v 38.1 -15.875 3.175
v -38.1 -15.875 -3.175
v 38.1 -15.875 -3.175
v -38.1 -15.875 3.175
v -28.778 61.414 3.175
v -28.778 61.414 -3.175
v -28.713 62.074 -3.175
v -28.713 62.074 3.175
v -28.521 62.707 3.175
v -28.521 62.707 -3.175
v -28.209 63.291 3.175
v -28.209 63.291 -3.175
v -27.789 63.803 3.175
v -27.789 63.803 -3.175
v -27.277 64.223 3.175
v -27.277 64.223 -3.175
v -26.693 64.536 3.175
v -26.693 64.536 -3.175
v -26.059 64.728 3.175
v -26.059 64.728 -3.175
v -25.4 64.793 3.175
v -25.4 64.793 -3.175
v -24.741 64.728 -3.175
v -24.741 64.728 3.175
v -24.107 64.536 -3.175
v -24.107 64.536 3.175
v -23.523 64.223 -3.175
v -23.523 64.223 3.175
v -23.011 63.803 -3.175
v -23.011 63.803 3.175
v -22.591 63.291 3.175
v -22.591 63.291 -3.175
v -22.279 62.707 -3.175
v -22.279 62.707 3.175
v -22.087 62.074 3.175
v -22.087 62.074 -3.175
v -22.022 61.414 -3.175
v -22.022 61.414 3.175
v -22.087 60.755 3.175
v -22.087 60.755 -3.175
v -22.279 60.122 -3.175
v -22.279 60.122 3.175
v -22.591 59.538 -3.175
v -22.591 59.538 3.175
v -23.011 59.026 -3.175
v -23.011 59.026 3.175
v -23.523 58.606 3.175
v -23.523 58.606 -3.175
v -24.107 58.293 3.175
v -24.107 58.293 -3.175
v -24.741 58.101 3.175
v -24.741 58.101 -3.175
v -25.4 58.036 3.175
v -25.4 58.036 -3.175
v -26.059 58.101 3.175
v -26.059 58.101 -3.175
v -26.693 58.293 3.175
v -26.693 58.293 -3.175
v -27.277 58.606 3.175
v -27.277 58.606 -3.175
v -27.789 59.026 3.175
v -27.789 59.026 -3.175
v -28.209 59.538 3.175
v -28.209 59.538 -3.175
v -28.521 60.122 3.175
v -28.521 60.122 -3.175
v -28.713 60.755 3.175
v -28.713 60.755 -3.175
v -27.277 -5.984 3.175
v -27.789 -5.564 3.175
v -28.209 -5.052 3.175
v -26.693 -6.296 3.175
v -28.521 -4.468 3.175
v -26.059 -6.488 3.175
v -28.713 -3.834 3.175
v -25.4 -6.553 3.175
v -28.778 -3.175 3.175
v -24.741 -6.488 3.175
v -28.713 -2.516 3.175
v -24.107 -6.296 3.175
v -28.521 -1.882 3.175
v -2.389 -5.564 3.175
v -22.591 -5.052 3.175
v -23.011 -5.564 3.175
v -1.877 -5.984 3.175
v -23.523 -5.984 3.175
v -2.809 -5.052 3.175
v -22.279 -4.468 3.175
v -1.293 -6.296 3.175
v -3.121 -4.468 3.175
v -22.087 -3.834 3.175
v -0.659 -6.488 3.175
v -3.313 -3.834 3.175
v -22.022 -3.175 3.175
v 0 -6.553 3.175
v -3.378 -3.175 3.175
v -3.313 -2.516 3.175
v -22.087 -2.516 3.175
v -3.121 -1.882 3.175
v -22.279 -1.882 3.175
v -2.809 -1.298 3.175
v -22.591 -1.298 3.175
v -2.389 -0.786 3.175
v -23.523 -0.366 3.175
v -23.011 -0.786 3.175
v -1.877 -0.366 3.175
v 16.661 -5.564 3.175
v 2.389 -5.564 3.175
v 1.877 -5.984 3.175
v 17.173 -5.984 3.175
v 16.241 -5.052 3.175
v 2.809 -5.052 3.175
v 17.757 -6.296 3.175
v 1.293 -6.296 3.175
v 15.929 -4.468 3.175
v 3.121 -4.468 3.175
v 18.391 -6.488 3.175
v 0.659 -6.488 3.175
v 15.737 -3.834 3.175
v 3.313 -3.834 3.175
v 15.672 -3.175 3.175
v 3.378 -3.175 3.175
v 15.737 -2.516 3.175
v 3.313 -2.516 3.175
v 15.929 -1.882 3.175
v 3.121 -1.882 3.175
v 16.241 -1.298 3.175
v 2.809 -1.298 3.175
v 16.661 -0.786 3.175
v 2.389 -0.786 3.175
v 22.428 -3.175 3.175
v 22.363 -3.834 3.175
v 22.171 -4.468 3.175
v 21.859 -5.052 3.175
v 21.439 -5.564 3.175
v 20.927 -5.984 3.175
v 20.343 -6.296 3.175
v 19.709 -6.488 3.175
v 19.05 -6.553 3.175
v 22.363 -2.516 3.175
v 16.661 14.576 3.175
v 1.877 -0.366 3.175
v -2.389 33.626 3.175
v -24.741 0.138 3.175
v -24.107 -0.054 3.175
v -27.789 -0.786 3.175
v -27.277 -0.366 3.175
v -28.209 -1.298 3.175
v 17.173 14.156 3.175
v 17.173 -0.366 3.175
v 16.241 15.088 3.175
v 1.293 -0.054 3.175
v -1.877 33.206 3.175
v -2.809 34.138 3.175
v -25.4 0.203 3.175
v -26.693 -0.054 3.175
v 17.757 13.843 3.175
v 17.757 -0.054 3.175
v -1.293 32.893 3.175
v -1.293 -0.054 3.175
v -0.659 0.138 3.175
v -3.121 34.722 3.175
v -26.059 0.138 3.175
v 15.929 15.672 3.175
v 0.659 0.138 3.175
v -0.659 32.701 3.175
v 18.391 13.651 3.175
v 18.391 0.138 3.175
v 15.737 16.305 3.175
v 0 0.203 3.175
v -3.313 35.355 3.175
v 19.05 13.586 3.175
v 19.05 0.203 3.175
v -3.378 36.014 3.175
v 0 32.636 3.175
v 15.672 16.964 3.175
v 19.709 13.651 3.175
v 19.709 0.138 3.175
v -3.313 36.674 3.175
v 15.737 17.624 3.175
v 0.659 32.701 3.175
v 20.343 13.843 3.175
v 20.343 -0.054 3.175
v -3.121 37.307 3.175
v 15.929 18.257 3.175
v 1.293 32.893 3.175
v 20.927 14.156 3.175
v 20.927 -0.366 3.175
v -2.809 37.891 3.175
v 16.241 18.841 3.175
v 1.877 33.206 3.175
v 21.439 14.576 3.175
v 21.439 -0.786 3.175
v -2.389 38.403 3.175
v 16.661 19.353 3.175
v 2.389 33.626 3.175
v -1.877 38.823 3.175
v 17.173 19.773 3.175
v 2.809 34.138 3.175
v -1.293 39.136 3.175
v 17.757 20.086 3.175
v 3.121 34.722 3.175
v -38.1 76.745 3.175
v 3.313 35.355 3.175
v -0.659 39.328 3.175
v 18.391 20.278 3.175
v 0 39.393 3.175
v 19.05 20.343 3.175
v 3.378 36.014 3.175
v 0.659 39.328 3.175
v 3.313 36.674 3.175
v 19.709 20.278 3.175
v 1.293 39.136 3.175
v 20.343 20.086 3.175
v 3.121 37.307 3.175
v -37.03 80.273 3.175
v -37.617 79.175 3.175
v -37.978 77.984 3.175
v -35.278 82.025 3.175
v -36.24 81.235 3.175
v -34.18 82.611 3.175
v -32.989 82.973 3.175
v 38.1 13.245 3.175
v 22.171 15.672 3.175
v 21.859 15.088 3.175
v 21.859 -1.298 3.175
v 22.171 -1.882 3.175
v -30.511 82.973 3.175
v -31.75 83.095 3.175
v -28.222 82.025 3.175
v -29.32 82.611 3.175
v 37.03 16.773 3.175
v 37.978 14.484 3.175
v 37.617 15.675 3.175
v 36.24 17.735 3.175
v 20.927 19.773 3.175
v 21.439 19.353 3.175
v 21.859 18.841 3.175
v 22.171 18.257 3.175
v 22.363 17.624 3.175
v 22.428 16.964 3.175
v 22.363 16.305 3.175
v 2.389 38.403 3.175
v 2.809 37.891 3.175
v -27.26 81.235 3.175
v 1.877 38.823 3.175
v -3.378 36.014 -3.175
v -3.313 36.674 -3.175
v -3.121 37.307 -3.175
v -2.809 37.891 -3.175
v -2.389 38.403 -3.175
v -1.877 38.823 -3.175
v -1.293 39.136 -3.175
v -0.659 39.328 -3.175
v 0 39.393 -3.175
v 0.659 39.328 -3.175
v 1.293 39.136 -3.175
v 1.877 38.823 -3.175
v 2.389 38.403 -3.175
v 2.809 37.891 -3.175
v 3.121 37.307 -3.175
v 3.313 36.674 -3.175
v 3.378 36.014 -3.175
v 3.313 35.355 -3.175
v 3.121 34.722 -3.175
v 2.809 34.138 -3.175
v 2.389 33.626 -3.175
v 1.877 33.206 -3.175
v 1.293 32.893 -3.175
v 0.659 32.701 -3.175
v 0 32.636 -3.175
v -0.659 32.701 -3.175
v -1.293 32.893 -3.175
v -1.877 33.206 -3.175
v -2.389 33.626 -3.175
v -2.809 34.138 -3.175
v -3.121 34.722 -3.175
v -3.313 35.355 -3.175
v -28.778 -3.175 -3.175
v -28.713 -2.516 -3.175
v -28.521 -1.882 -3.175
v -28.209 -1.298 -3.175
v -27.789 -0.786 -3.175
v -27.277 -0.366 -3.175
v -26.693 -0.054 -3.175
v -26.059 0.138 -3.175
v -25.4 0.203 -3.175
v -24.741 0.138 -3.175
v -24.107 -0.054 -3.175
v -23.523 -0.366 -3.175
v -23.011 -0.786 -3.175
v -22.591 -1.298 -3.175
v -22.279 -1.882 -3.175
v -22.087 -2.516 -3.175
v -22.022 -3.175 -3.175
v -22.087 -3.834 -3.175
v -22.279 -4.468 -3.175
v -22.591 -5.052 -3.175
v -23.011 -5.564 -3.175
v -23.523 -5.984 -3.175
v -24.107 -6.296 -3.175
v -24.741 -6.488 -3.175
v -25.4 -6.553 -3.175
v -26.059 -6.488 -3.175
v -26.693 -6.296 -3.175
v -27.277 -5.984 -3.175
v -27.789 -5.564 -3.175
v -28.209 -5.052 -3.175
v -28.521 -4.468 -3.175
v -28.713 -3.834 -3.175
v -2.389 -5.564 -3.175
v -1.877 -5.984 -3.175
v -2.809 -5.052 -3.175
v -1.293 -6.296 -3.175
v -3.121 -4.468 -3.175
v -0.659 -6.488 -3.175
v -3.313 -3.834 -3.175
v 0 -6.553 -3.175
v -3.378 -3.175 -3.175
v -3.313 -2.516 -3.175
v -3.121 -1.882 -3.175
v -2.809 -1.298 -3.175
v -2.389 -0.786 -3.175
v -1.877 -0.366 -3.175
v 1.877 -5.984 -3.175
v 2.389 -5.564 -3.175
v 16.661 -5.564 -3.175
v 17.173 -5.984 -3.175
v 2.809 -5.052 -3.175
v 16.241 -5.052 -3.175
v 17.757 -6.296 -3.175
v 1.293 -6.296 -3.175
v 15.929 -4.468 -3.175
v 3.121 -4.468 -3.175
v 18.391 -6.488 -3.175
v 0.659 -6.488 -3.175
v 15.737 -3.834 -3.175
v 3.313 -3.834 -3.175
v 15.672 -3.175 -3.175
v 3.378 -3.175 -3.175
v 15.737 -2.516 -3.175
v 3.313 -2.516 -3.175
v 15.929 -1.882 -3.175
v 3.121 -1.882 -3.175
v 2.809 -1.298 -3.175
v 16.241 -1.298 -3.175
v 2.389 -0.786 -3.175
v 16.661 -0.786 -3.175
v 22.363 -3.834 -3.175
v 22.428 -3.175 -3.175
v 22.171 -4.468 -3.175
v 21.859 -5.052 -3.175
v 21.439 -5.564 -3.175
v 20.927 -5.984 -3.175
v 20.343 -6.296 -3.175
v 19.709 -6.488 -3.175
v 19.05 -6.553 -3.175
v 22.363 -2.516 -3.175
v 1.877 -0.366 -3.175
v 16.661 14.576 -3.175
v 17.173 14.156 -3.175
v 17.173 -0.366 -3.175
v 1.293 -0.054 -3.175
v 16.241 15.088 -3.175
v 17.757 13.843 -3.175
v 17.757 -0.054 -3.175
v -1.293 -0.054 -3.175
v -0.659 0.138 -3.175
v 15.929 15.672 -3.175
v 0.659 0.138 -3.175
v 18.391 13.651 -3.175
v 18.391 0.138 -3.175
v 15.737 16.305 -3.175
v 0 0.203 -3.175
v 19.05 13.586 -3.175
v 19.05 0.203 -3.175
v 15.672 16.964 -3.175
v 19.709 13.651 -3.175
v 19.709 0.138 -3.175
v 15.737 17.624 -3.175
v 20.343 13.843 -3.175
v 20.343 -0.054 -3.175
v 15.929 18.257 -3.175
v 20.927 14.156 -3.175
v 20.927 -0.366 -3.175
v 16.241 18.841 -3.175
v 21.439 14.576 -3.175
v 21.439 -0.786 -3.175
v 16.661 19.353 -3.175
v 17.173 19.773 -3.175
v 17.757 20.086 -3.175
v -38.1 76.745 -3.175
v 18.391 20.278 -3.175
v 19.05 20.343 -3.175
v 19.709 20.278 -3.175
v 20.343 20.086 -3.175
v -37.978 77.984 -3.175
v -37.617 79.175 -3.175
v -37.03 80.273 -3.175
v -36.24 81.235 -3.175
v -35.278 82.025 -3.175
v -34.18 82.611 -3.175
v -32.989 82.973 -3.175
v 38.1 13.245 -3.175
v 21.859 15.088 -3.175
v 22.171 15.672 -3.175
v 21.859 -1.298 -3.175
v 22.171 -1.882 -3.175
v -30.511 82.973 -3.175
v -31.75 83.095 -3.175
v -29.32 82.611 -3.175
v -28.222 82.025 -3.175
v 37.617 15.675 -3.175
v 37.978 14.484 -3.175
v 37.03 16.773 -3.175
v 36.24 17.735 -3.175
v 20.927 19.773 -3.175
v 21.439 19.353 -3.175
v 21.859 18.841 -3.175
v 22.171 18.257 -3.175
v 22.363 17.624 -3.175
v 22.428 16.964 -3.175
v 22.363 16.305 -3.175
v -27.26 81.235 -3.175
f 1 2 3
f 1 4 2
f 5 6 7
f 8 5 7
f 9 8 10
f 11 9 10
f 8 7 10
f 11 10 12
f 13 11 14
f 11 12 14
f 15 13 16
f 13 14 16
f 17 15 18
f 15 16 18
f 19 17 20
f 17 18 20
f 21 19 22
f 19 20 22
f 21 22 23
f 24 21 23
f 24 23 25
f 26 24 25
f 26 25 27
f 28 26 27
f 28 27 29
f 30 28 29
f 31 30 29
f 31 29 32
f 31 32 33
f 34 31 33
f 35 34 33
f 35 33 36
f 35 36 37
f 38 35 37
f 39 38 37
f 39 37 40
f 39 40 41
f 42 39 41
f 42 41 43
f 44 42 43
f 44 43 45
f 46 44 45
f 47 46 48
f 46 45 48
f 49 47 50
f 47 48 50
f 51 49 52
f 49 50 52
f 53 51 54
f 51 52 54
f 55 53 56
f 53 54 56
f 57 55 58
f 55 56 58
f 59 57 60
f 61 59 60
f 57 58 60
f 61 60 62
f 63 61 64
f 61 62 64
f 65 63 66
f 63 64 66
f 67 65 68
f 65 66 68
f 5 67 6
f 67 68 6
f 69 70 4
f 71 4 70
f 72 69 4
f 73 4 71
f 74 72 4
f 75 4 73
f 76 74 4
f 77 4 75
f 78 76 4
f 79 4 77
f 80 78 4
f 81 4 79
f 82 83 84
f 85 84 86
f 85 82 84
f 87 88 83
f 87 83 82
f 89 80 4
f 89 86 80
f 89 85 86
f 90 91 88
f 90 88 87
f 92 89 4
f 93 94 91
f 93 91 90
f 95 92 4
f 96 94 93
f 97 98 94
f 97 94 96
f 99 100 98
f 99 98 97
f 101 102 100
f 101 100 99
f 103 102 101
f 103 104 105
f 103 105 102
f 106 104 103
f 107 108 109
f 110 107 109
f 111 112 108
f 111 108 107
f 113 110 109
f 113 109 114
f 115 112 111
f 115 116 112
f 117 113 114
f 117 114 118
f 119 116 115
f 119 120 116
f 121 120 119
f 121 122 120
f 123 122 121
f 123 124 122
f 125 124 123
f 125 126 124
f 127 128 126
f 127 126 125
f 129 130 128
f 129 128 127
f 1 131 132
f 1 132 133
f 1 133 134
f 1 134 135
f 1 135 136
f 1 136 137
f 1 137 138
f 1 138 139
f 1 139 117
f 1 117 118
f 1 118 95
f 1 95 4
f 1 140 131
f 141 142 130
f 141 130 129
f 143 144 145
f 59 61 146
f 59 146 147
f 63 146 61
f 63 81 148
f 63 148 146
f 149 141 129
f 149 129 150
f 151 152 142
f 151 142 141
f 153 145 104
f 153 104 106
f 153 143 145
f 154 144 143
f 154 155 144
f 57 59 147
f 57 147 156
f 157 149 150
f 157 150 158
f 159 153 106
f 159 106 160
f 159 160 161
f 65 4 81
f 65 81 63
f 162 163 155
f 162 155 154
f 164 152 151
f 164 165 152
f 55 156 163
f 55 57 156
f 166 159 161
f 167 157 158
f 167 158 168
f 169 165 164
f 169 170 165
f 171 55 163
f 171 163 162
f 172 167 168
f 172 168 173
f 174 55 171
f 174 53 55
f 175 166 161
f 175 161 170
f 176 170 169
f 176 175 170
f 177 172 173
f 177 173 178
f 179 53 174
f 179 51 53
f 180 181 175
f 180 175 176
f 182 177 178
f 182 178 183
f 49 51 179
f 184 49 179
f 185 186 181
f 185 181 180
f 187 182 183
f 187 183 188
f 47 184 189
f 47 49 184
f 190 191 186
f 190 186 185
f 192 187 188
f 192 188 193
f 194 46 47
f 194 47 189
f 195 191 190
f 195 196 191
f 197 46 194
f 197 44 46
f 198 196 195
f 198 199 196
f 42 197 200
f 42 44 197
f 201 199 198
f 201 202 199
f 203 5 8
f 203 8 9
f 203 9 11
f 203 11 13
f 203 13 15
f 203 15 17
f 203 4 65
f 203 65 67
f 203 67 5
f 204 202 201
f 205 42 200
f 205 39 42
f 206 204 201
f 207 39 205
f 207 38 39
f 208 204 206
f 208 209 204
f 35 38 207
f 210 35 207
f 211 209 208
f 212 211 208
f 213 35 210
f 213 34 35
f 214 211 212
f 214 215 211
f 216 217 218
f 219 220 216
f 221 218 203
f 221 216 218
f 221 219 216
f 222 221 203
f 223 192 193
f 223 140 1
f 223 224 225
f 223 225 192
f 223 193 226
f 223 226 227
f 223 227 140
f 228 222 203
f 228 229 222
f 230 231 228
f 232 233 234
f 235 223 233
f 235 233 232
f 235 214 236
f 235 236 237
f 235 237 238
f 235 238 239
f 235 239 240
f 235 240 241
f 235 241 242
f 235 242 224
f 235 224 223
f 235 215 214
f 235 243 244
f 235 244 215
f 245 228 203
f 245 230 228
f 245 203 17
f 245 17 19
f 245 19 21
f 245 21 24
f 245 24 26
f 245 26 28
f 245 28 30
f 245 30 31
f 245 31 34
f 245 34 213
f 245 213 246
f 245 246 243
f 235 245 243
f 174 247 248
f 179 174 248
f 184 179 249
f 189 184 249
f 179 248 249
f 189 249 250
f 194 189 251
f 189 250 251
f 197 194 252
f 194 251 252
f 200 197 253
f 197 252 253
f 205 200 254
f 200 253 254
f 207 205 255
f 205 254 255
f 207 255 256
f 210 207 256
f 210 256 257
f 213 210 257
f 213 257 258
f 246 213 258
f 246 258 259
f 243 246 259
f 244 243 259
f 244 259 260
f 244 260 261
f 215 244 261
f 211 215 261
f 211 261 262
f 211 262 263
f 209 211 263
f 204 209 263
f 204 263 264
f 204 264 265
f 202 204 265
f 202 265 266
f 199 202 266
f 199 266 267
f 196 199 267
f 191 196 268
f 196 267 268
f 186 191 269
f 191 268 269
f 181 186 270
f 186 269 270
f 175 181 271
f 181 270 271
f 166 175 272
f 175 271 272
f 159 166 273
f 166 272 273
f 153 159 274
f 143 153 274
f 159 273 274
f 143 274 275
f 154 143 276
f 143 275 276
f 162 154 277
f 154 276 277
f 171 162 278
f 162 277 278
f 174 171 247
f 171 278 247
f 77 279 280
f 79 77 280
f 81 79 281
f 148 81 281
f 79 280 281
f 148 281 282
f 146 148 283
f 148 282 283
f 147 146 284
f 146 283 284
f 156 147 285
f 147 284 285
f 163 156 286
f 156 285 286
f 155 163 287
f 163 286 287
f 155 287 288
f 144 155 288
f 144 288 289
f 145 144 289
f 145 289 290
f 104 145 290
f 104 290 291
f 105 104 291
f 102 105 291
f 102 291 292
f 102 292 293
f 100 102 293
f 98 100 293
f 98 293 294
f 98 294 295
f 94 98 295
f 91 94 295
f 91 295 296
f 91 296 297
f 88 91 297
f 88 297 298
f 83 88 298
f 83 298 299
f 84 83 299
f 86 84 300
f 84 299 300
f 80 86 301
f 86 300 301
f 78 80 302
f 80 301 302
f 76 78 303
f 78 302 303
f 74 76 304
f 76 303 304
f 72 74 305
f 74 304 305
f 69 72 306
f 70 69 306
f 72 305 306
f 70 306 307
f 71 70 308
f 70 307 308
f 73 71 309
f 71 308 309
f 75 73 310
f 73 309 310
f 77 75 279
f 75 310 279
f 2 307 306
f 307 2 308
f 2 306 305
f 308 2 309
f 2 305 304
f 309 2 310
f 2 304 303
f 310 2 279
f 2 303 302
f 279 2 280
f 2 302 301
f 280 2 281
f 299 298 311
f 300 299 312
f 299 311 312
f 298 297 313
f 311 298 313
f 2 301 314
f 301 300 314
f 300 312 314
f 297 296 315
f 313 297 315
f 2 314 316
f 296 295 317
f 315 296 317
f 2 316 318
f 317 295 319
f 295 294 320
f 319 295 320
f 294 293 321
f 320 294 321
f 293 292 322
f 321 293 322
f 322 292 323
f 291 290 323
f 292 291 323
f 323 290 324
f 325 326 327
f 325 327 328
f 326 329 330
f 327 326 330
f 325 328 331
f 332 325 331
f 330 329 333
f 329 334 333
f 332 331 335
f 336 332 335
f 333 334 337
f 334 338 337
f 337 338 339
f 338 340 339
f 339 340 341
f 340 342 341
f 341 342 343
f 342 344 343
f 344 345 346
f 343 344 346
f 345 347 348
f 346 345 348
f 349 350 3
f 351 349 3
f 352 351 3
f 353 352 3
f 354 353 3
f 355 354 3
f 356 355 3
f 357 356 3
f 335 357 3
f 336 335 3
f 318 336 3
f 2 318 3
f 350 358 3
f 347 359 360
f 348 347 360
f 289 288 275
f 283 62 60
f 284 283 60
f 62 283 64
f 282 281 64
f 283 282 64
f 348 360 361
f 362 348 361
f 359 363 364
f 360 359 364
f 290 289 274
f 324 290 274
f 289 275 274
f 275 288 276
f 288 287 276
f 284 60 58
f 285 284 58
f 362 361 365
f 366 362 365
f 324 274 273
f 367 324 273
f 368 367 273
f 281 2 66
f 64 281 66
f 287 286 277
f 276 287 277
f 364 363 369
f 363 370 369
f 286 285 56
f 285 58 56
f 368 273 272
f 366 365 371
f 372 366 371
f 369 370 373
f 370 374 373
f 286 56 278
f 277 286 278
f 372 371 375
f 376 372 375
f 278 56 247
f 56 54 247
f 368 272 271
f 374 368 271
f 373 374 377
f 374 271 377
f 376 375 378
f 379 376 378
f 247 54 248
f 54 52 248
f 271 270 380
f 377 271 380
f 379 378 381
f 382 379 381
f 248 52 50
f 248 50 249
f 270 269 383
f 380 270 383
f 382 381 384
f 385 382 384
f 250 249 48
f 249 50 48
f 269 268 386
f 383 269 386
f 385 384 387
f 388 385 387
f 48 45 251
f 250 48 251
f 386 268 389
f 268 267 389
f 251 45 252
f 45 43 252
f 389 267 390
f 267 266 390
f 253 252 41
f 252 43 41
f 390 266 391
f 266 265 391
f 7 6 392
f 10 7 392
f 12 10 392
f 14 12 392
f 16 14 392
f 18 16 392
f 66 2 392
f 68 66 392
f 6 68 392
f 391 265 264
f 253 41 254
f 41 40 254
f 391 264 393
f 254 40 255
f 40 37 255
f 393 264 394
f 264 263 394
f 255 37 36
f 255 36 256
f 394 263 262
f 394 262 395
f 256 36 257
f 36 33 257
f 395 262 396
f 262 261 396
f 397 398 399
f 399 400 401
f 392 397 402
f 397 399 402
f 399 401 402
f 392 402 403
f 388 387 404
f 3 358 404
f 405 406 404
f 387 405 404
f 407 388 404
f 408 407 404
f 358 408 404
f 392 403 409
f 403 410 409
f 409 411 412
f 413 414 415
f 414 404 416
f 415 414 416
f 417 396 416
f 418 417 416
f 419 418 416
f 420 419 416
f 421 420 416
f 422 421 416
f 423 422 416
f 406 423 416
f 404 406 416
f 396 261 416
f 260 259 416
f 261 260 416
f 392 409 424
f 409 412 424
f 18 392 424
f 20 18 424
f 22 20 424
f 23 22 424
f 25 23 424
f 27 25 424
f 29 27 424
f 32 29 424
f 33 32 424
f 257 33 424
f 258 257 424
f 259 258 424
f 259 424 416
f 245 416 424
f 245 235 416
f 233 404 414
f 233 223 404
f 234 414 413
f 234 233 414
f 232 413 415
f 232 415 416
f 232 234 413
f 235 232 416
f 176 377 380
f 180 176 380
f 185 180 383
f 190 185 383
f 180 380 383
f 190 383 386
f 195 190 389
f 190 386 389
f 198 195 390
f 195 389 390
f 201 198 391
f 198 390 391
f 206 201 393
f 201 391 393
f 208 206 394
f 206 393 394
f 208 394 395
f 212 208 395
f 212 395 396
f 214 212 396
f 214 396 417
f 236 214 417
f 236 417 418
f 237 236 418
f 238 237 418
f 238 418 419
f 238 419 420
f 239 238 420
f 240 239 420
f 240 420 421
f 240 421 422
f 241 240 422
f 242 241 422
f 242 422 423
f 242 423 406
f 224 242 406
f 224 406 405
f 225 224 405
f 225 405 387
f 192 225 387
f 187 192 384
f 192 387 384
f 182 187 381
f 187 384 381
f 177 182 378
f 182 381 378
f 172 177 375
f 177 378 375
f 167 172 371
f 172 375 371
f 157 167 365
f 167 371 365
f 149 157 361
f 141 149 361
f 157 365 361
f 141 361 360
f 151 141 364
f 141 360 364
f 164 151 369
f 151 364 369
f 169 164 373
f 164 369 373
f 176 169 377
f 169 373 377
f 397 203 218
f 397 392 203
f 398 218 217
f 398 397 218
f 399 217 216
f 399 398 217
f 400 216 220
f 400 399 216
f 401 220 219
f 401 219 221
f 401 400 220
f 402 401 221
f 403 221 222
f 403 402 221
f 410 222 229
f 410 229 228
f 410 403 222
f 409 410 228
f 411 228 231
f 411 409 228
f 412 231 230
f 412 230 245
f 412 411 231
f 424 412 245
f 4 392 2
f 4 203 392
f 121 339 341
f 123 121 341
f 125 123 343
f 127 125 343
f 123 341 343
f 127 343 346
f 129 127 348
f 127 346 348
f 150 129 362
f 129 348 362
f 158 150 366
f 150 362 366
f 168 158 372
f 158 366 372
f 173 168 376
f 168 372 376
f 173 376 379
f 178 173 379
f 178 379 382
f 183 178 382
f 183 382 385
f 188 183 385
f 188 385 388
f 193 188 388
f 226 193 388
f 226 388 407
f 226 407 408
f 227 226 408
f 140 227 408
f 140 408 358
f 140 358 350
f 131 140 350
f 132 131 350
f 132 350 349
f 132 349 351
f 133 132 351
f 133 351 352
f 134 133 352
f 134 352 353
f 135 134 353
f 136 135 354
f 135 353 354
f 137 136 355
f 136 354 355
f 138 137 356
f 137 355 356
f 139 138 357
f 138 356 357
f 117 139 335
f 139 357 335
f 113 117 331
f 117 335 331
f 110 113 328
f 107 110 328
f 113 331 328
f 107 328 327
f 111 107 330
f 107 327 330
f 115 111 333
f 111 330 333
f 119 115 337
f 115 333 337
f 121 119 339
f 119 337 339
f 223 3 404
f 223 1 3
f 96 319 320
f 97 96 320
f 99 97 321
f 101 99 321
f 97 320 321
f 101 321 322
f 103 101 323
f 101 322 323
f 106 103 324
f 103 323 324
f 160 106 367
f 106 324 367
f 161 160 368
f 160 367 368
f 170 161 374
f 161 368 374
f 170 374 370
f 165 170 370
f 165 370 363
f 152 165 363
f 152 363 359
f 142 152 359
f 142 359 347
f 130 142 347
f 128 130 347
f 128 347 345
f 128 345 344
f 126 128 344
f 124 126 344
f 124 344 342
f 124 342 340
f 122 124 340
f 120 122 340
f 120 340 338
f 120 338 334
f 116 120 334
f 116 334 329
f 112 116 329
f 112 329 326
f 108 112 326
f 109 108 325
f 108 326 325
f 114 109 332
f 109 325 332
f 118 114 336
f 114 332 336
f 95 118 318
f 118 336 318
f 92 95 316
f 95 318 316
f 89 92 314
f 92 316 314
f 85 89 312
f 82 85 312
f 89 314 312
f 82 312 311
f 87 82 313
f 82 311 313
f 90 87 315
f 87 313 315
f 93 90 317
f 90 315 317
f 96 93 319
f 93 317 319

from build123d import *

# Parameters (mm, degrees)
BOSS_EXTRUDE1_DEPTH     = 3.175
F_1_4_CLEARANCE_HOLE1_D = 6.7564
FILLET1_R               = 6.35


with BuildPart() as part:
    # Sketch1 → Boss-Extrude1 (new, symmetric)
    with BuildSketch(Plane.XY):
        Polygon((-38.1, -15.875), (38.1, -15.875), (38.1, 15.875), (-38.1, 92.075), align=None)
    extrude(amount=BOSS_EXTRUDE1_DEPTH, both=True)

    # 1/4 Clearance Hole1 (through all)
    with Locations(Plane.XY.offset(3.175)):
        with Locations((-25.4, 61.414487758), (0, 36.014487758), (19.05, 16.964487758), (-25.4, -3.175), (19.05, -3.175), (0, -3.175)):
            Hole(F_1_4_CLEARANCE_HOLE1_D / 2)

    # Fillet1
    fillet1_edges = [part.edges().sort_by_distance(p)[0] for p in [
        (-38.1, 92.075, 0),
        (38.1, 15.875, 0),
    ]]
    fillet(fillet1_edges, radius=FILLET1_R)


solid = part.part
